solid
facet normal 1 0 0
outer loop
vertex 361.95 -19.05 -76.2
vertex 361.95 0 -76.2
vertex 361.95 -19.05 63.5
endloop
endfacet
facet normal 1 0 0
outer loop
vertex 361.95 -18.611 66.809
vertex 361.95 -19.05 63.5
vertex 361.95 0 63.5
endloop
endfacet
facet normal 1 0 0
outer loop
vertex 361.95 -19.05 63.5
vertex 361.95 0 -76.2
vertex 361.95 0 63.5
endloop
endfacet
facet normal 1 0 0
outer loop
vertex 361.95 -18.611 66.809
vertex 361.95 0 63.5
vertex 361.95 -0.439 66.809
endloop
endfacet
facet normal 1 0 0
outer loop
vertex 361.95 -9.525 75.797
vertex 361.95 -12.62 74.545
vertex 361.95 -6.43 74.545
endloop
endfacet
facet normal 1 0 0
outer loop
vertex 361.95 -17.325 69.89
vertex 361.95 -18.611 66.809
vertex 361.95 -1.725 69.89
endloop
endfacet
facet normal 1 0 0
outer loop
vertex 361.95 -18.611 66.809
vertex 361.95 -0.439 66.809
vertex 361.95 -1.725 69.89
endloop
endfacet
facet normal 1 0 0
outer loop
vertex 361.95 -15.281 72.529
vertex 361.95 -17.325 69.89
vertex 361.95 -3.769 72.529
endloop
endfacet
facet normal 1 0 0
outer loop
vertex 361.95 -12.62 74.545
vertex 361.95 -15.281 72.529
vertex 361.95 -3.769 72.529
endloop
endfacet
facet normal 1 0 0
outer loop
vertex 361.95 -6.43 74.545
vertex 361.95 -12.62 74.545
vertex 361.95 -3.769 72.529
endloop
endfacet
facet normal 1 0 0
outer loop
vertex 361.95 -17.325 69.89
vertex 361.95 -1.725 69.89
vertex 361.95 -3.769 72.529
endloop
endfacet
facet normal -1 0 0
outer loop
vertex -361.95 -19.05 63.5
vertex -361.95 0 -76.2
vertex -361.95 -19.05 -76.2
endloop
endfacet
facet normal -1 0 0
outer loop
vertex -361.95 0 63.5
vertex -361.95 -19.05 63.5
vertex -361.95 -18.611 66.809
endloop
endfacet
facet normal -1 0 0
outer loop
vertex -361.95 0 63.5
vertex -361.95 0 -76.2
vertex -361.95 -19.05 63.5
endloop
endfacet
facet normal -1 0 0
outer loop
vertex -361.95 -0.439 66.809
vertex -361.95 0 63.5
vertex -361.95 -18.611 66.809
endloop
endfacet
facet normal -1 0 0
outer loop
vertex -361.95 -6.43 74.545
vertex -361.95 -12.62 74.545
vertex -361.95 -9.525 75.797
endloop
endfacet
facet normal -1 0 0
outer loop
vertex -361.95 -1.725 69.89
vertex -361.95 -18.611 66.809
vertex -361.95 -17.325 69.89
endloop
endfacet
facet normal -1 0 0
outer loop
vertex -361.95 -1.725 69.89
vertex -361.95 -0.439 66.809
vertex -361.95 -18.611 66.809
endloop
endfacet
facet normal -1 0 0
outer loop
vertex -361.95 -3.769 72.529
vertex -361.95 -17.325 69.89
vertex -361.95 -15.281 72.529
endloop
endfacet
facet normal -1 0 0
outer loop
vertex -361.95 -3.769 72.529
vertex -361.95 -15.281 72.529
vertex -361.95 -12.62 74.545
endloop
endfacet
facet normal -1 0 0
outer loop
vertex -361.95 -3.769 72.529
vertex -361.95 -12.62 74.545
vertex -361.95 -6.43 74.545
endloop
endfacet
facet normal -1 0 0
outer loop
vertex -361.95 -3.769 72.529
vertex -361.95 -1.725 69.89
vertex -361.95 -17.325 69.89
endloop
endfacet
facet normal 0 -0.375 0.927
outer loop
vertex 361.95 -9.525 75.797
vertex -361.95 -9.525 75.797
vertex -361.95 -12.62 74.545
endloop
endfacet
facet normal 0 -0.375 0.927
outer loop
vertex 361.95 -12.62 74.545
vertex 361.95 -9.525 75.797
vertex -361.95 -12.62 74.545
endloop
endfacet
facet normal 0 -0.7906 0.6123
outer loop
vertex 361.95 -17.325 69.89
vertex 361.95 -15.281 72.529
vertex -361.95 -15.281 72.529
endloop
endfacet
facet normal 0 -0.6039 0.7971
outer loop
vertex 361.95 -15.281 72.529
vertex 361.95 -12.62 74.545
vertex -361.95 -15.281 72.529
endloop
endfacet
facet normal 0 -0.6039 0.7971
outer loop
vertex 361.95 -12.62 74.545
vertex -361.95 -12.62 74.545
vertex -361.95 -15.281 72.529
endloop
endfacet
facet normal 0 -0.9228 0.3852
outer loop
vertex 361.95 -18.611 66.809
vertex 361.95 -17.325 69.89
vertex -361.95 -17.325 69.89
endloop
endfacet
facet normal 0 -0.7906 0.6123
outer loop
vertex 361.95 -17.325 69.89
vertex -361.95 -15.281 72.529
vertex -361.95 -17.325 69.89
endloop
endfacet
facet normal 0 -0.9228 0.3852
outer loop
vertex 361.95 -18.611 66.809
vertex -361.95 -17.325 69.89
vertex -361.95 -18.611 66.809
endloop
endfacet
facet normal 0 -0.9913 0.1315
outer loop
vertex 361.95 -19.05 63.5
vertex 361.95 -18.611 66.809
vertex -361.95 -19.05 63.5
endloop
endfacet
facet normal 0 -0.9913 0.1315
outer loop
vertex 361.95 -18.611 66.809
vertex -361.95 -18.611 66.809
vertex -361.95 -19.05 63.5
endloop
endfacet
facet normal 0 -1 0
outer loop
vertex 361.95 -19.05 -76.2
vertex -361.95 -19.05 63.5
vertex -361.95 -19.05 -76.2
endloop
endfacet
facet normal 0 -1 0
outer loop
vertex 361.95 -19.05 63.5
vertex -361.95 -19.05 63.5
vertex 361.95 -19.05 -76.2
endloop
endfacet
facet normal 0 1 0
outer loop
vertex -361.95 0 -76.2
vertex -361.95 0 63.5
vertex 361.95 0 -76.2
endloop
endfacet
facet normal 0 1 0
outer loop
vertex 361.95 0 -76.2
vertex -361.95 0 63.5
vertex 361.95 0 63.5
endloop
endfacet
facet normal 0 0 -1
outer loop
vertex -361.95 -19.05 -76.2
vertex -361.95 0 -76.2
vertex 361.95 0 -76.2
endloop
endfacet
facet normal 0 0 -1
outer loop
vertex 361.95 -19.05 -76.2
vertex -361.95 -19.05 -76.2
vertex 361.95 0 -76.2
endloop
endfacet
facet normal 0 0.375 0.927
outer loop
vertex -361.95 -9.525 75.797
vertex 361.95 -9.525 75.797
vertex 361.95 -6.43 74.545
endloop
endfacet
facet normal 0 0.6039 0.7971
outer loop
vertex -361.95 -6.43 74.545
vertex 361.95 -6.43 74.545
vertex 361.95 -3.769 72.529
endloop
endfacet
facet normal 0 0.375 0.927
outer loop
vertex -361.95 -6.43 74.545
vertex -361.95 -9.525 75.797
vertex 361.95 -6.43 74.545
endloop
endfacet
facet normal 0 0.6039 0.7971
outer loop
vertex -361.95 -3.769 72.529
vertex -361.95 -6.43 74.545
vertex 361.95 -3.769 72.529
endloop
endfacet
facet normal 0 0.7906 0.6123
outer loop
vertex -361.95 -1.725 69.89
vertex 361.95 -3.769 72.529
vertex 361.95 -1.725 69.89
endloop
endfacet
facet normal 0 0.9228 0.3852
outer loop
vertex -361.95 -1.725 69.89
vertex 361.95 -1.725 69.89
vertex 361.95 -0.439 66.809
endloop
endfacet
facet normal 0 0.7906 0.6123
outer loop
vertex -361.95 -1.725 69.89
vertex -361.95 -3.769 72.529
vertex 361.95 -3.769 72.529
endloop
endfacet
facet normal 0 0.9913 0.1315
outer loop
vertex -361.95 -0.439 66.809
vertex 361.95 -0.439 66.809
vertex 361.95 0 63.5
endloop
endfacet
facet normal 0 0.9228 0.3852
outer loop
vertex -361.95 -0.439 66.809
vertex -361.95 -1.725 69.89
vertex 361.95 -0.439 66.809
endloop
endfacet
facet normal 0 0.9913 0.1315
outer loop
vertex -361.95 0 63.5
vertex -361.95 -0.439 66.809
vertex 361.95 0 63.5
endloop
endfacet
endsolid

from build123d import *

# Parameters (mm, degrees)
F0_W        = 723.9
F0_H        = 152.4
F1_DEPTH    = 19.05
F2_T1_DEPTH = 787.4


# Not quite as in the source:
# - a fillet or chamfer that OpenCascade refuses, or shapes differently, is made with other operations: its cross-section is extruded or revolved along the edge and cut away or added


with BuildPart() as f1:
    # F0 (on Front) → F1 (new body)
    with BuildSketch(Plane.XZ):
        Rectangle(F0_W, F0_H)
    extrude(amount=F1_DEPTH)

    # F2: fillet of radius 12.7 on 2 edges, made by hand

    # F2_s2 → F2_t1 (cut)
    with BuildSketch(Plane.YZ.offset(-393.7)):
        with BuildLine():
            ThreePointArc((-12.7, 76.2), (-3.7197438789, 72.4802561211), (0, 63.5))
            Line((0, 63.5), (0, 76.2))
            Line((0, 76.2), (-12.7, 76.2))
        make_face()
        with BuildLine():
            ThreePointArc((-6.35, 76.2), (-15.3302561211, 72.4802561211), (-19.05, 63.5))
            Line((-19.05, 63.5), (-19.05, 76.2))
            Line((-19.05, 76.2), (-6.35, 76.2))
        make_face()
    extrude(amount=F2_T1_DEPTH, mode=Mode.SUBTRACT)


solid = f1.part
